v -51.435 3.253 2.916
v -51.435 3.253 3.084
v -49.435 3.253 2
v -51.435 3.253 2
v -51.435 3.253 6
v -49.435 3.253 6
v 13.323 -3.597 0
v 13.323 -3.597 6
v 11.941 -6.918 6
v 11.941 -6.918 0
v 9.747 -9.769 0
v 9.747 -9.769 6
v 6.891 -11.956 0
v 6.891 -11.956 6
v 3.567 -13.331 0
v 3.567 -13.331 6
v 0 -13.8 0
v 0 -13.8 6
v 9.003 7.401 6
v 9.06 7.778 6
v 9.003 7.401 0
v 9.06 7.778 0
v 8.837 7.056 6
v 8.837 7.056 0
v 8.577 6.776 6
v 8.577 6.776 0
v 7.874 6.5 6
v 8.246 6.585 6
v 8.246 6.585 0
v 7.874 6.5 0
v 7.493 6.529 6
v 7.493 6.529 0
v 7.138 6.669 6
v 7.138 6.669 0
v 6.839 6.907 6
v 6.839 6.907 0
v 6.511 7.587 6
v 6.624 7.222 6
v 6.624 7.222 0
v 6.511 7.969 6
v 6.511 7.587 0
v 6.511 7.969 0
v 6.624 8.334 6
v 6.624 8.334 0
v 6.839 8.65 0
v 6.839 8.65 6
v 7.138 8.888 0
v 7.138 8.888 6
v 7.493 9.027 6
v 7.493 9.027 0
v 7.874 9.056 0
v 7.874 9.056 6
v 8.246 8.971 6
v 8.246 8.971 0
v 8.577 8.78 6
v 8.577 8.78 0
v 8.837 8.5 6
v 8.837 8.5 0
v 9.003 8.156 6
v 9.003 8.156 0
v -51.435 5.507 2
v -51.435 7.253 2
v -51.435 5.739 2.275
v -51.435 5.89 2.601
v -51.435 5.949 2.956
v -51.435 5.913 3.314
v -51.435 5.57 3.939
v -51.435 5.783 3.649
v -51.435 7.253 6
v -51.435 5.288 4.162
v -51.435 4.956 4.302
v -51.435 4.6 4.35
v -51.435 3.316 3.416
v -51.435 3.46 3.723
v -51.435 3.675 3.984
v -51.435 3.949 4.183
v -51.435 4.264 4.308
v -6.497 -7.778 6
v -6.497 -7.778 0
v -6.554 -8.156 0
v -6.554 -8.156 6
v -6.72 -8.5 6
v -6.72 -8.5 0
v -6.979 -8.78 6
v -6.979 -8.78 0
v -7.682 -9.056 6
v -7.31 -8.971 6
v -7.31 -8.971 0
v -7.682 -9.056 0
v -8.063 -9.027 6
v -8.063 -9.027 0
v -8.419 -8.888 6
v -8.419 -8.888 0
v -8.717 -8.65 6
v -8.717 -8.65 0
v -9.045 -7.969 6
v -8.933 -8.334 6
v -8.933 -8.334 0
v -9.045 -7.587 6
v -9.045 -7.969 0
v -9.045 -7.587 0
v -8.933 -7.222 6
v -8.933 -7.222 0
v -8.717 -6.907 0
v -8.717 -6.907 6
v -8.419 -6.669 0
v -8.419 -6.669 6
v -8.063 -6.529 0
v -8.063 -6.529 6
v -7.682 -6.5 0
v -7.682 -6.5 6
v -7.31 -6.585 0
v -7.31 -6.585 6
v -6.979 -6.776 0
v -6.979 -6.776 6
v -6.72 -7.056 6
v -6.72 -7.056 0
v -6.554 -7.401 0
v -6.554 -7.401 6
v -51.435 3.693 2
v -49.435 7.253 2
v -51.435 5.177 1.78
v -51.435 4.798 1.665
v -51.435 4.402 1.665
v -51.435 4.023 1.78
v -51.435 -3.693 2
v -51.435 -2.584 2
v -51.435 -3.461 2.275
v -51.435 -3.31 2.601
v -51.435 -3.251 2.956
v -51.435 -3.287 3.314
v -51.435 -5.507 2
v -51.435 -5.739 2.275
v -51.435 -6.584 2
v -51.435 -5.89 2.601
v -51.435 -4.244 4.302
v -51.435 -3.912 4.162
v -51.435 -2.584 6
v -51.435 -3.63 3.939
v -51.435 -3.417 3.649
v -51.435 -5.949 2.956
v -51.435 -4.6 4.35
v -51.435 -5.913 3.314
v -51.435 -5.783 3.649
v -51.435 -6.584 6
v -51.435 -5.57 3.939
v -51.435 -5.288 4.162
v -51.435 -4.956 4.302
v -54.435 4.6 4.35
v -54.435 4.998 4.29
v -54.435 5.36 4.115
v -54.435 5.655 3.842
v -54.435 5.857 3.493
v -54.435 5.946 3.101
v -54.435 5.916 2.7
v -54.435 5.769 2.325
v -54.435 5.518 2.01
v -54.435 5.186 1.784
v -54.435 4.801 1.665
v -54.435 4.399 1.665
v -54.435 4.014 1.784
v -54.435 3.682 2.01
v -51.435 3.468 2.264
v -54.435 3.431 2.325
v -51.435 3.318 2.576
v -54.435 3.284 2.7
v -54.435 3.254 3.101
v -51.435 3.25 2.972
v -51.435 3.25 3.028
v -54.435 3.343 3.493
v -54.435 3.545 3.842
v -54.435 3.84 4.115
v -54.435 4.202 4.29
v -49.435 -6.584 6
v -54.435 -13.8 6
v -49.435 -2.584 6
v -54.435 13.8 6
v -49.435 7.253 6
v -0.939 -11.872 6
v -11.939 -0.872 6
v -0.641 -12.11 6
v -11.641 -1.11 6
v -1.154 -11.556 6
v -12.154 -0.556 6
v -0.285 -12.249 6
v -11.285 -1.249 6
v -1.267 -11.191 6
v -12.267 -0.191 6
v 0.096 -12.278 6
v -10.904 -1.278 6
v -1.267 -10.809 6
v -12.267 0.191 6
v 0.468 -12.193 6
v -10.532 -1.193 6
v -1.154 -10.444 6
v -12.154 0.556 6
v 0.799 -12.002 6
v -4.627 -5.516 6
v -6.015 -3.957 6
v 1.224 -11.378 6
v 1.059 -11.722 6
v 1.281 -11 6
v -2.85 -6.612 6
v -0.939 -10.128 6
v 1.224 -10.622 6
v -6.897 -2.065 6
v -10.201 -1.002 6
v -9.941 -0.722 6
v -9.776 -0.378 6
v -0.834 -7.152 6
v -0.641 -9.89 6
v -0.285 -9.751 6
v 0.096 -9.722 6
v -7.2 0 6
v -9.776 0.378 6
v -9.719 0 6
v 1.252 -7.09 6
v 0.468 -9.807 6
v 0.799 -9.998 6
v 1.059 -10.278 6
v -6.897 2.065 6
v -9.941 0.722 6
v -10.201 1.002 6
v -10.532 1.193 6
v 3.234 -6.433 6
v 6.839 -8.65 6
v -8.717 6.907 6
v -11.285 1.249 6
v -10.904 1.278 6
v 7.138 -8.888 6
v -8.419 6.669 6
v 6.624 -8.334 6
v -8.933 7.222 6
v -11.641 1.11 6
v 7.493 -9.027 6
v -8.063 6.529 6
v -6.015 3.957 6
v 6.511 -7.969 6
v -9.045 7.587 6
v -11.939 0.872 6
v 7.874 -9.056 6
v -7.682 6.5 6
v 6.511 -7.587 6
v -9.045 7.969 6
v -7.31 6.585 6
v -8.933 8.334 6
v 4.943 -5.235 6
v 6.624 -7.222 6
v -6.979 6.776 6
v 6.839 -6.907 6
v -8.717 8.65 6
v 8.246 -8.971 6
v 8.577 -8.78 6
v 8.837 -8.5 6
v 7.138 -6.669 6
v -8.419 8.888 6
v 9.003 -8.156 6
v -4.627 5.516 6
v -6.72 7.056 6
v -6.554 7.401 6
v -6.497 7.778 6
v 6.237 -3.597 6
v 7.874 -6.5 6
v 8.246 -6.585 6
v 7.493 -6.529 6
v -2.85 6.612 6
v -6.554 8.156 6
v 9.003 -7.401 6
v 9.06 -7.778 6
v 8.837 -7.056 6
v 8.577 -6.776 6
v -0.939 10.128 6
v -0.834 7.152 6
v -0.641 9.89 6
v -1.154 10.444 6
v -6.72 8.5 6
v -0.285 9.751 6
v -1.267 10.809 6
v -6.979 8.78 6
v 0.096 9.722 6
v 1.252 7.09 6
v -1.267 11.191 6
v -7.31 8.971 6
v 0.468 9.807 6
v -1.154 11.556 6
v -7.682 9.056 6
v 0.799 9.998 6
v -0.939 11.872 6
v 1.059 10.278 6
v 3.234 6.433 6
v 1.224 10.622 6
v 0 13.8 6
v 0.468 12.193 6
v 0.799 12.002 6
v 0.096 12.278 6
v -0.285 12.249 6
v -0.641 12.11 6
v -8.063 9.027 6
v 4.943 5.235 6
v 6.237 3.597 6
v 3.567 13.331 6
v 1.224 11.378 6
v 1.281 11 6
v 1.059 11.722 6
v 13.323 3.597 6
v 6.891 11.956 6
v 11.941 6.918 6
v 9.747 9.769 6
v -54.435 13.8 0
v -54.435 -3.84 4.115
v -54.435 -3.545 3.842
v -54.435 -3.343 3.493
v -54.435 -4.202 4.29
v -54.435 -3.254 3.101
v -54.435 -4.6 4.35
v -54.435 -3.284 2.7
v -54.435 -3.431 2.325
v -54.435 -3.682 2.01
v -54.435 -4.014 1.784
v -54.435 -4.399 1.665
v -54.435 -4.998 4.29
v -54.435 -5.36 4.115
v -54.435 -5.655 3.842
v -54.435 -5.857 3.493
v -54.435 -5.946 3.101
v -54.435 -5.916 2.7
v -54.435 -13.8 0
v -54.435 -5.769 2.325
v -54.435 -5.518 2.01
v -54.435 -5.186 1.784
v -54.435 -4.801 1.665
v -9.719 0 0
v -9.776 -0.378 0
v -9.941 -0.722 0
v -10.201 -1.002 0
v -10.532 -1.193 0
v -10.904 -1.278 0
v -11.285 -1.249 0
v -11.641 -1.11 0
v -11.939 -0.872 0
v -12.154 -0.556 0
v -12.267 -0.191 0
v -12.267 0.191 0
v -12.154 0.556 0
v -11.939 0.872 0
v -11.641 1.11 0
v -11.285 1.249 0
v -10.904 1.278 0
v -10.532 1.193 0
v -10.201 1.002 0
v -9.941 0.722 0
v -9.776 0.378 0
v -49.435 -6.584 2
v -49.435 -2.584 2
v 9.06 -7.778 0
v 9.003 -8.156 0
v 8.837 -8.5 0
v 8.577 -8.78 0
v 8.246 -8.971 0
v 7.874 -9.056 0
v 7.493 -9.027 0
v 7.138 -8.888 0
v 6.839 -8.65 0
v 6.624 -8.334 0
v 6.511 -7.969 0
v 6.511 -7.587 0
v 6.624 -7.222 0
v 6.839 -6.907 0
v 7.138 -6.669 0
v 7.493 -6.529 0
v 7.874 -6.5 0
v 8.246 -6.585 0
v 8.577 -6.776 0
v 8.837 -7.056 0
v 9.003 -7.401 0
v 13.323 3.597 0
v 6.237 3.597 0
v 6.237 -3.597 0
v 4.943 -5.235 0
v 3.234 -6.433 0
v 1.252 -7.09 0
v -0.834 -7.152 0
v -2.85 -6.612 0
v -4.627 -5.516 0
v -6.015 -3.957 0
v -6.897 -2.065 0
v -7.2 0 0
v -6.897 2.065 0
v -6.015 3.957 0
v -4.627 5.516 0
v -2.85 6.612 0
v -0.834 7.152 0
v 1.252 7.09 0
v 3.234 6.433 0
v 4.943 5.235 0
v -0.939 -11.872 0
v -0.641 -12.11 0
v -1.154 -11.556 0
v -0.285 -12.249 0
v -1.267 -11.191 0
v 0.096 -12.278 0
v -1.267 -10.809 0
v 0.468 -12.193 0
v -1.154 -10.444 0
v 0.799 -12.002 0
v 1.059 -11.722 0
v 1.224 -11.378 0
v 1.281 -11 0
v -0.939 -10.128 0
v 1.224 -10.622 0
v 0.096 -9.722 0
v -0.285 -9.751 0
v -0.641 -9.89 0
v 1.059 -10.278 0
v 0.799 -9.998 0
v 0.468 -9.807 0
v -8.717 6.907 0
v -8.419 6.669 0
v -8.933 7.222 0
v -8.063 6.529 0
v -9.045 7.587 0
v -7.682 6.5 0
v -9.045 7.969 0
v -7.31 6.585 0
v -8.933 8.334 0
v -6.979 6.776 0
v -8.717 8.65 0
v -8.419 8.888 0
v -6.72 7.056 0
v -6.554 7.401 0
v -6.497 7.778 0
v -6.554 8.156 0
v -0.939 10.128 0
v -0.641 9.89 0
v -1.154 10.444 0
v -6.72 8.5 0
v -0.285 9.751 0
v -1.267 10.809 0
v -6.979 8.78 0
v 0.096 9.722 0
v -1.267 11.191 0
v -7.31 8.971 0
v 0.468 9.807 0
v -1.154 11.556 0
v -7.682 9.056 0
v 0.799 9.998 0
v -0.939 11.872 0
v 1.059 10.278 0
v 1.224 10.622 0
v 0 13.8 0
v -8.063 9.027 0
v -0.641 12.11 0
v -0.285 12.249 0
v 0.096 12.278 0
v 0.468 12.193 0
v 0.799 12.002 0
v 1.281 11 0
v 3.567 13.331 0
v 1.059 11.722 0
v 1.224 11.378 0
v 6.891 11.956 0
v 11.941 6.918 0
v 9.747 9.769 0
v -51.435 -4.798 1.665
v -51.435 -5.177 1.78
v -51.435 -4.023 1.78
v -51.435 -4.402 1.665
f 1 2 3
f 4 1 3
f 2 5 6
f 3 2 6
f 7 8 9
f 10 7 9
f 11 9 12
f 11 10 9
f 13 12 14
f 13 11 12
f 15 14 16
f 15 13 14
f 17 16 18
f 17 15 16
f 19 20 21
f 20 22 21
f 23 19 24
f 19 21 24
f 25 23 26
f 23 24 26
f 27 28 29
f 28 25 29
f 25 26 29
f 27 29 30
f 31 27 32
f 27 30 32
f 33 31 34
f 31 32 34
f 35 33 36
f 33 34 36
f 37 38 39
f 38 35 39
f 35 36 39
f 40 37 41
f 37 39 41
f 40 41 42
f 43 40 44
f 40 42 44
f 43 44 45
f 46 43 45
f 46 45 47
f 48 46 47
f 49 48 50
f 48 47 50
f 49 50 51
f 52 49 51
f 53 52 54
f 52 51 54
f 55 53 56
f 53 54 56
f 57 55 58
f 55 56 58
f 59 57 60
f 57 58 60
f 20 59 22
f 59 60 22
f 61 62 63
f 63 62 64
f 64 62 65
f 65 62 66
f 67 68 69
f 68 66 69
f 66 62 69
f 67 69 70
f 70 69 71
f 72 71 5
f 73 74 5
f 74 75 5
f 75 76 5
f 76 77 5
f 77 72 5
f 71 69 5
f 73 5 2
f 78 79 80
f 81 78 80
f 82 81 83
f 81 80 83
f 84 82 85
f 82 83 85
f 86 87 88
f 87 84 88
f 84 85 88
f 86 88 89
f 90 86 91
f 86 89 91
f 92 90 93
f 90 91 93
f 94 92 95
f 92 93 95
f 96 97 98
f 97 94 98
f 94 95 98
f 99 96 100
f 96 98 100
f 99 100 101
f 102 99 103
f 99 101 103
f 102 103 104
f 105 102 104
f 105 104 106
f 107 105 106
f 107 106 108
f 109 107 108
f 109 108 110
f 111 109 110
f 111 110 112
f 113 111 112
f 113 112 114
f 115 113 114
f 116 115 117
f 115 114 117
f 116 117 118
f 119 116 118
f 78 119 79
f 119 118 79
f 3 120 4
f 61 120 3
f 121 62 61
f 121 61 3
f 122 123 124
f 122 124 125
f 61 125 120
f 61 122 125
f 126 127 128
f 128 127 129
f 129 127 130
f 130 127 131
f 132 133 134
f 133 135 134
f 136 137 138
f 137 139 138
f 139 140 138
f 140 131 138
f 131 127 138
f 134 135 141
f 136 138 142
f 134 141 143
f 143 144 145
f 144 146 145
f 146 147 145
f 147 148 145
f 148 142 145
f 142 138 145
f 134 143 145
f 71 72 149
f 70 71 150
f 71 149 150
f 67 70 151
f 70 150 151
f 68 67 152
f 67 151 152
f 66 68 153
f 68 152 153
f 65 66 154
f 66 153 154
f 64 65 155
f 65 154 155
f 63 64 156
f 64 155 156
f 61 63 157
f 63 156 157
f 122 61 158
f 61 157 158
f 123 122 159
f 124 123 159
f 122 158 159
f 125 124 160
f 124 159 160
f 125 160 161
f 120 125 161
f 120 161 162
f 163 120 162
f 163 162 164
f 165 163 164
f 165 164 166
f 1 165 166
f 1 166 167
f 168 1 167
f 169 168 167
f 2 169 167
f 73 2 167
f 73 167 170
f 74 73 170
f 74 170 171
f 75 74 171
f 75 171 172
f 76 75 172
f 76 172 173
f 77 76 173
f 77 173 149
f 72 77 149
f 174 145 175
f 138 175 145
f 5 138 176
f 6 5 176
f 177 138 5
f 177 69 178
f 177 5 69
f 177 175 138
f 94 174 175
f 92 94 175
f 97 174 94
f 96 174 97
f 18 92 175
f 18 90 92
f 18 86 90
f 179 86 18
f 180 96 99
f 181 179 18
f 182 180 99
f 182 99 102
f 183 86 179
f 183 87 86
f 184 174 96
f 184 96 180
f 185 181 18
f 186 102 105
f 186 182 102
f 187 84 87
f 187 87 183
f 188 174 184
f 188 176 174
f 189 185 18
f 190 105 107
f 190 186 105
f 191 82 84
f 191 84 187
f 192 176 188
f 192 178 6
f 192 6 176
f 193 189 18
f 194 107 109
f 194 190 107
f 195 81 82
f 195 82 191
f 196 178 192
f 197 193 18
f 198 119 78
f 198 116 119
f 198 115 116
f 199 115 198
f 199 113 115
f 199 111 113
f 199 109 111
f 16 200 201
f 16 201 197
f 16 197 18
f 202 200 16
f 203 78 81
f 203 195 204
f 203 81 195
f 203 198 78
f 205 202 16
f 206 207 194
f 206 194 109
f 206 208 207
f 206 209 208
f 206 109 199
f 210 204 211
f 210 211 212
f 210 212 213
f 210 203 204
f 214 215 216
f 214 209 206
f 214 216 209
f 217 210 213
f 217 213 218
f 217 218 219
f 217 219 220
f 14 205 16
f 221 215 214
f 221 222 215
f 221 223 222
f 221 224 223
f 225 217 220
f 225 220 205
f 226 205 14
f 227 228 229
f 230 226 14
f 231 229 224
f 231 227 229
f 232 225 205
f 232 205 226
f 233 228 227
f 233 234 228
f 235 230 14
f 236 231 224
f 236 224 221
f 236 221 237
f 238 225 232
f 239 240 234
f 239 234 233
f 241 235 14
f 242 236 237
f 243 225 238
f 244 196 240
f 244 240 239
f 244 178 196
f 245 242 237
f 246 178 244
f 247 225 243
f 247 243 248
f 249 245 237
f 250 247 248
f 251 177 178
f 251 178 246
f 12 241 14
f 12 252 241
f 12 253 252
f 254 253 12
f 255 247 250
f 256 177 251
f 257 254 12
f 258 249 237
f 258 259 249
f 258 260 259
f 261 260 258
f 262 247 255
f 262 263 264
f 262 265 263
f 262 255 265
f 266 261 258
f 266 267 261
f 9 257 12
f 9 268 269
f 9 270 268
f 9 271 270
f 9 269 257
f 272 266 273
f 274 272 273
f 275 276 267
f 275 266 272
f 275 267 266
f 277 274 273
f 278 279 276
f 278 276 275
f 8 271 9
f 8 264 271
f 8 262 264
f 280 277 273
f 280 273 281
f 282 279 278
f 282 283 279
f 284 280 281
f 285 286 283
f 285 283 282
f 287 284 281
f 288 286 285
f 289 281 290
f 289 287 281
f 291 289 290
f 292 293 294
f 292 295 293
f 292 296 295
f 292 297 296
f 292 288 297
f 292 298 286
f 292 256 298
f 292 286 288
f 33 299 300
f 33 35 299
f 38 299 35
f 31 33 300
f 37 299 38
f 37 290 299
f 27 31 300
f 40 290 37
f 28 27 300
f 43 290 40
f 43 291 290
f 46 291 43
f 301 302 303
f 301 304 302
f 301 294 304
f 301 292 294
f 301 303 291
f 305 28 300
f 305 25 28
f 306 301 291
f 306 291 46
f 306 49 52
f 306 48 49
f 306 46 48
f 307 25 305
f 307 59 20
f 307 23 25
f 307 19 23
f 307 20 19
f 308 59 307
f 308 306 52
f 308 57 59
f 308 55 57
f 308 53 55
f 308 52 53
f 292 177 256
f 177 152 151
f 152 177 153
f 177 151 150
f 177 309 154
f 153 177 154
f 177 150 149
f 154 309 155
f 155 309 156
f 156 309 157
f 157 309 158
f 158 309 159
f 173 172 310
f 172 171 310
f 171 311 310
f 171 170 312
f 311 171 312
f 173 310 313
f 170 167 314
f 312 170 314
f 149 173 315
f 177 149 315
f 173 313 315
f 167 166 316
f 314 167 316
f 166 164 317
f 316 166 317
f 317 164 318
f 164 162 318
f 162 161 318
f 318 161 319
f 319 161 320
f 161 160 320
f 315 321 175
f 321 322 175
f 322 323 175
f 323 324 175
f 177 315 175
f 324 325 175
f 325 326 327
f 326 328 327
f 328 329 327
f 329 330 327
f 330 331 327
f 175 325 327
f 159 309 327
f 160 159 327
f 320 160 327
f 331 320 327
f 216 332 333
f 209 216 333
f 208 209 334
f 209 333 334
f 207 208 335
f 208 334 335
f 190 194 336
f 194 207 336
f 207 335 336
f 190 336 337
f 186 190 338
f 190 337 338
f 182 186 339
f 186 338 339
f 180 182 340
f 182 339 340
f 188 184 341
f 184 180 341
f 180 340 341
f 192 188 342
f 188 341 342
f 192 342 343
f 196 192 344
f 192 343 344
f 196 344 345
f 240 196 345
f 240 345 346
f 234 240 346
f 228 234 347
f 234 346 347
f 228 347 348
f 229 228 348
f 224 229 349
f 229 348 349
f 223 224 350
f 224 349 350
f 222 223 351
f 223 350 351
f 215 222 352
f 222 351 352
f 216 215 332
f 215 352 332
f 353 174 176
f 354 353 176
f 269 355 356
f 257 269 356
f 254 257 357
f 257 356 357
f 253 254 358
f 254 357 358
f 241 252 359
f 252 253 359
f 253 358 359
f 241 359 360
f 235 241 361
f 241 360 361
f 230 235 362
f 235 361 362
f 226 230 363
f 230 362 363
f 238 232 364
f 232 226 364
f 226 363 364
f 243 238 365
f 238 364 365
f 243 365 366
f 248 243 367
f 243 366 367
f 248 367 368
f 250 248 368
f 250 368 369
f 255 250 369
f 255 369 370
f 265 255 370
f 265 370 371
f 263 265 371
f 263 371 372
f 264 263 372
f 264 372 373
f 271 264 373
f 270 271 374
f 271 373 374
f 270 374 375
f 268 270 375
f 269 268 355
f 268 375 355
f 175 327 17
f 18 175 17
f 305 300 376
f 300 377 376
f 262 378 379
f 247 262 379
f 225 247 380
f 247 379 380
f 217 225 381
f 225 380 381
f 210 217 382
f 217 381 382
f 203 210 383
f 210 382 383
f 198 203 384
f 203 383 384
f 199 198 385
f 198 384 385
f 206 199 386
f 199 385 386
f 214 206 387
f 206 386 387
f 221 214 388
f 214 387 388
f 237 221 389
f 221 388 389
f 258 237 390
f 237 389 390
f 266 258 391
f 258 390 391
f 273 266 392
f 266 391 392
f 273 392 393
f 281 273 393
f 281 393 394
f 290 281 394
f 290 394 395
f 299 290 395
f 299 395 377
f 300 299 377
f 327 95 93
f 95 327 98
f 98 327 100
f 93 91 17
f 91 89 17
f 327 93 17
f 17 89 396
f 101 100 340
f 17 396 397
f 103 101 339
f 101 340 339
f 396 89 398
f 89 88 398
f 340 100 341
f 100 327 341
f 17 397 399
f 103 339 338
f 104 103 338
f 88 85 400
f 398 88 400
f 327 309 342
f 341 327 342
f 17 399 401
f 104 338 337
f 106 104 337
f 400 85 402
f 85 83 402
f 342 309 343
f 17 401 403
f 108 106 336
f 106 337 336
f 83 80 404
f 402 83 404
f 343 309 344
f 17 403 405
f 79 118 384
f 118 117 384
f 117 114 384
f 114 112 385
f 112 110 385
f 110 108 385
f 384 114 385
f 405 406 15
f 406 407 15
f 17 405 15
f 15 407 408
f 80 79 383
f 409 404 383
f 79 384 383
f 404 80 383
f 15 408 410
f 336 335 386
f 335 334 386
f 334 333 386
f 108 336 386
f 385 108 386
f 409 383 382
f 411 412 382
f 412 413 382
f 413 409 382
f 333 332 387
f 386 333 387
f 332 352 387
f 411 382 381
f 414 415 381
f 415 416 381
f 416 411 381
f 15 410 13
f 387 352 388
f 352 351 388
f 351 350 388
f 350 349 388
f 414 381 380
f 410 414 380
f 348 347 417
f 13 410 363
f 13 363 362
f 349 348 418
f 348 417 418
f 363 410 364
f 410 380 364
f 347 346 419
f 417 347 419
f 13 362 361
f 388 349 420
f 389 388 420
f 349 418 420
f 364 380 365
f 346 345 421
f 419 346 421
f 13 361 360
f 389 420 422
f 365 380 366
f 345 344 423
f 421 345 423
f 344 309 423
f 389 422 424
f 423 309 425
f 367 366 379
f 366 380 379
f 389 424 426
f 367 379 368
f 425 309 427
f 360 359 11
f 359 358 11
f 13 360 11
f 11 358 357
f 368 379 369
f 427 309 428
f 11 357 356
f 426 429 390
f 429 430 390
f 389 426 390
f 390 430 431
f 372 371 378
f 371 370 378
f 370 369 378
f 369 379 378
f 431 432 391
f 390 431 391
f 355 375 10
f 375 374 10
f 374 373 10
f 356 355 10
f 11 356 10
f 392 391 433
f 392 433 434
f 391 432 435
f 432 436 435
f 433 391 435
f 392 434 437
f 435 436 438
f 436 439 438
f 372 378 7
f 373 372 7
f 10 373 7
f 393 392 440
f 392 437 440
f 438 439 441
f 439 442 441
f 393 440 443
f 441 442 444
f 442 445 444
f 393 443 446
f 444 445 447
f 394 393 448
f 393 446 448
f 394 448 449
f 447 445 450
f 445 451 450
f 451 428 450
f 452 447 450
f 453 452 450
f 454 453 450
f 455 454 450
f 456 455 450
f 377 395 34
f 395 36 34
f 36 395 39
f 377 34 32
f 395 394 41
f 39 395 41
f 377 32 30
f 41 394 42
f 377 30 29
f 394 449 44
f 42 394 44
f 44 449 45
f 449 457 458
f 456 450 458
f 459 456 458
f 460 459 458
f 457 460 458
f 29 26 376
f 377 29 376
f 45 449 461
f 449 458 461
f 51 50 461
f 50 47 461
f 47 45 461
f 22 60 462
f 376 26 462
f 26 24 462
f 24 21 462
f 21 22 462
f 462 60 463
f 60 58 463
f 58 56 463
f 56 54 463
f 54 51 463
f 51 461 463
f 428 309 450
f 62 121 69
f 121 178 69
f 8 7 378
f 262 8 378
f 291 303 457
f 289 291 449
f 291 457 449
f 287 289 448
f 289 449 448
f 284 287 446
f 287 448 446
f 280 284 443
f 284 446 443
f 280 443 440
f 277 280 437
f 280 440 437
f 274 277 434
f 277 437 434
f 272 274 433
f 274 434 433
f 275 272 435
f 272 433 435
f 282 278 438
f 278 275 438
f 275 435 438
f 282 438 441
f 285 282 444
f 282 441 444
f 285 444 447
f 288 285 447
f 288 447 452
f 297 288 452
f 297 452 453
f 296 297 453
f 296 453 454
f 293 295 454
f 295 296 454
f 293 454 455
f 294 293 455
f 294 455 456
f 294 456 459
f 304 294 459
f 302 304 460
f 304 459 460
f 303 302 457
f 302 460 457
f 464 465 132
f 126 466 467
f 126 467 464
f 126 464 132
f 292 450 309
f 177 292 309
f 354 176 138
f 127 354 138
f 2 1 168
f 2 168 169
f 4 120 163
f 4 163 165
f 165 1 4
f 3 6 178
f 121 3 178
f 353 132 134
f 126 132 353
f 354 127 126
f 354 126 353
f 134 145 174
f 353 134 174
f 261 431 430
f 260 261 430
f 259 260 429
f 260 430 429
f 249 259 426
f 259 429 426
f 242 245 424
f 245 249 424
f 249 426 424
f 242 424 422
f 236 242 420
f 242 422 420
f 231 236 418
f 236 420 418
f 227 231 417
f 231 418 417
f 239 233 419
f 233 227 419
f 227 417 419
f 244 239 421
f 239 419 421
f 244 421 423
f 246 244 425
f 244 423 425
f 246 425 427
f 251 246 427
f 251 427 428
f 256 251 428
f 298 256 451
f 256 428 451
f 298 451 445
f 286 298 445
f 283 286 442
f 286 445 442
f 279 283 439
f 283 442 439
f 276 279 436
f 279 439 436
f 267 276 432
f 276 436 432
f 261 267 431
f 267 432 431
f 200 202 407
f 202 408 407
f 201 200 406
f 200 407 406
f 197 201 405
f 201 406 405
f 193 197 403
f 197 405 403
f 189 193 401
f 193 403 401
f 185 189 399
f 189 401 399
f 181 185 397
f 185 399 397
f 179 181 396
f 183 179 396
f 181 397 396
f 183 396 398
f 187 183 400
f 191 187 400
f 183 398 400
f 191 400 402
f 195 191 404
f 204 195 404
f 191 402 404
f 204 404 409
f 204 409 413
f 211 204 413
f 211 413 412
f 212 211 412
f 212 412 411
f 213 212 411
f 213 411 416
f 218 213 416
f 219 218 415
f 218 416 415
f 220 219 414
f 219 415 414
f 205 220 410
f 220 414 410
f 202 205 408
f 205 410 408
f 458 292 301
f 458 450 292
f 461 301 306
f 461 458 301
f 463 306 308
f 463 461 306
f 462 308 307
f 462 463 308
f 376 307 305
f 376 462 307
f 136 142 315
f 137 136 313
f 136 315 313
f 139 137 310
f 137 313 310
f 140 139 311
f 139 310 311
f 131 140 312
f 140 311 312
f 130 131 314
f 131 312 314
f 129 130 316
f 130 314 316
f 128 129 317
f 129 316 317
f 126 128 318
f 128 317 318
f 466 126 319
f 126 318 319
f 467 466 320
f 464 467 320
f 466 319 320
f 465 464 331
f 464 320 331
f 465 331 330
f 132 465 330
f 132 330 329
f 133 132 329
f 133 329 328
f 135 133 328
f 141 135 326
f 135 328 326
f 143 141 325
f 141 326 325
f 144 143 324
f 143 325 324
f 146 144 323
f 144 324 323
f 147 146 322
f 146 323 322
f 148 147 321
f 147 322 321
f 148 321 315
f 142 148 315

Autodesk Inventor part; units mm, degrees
ref_plane "YZ Plane" through (0, 0, 0) normal (1, 0, 0) x (0, 1, 0)
ref_plane "XZ Plane" through (0, 0, 0) normal (0, 1, 0) x (-1, 0, 0)
ref_plane "XY Plane" through (0, 0, 0) normal (0, 0, 1) x (1, 0, 0)
sketch "스케치1" plane through (0, 0, 0) normal (0, 0, 1) x (1, 0, 0)
  circle A0 centre (0, 0) radius 13.8 projected
  circle A1 centre (0, 0) radius 7.2 projected
  circle A2 centre (0, -11) radius 1.2813 projected
  circle A3 centre (-7.7782, -7.7782) radius 1.2813 projected
  circle A4 centre (-11, 0) radius 1.2813 projected
  circle A5 centre (-7.7782, 7.7782) radius 1.2813 projected
  circle A6 centre (0, 11) radius 1.2813 projected
  circle A7 centre (7.7782, 7.7782) radius 1.2813 projected
  circle A8 centre (11, 0) radius 1.2813 projected
  circle A9 centre (7.7782, -7.7782) radius 1.2813 projected
  circle A10 centre (0, 0) radius 3.15 projected
  circle A11 centre (0, 0) radius 3.5972
  line L0 (0, -3.5972) -> (0, 3.5972)
  line L1 (0, 3.5972) -> (17.7956, 3.5972)
  line L2 (17.7956, 3.5972) -> (17.7956, -3.5972)
  line L3 (17.7956, -3.5972) -> (0, -3.5972)
  line L4 (-54.4347, 13.8) -> (-54.4347, -13.8) projected
  line L5 (0, -13.8) -> (0, 13.8)
  line L6 (0, 13.8) -> (-54.4347, 13.8)
  line L7 (-54.4347, 13.8) -> (-54.4347, -13.8)
  line L8 (-54.4347, -13.8) -> (0, -13.8)
  point P0 (0, 0)
  point P1 (6.237, 3.5972)
  point P2 (13.3229, 3.5972)
  point P3 (13.3229, -3.5972)
  point P4 (6.237, -3.5972)
extrude "돌출1" add sketch "스케치1" along normal blind 6 contours L5 A6 A1 A2 A0 | A0 L1 A1 L5 A6 | A0 L8 L4 L6 | L5 A2 A1 L3 A0
sketch "스케치2" plane through (-54.4347, -13.8, 0) normal (-1, 0, 0) x (0, 0, 1)
  line L0 (0, 13.8) -> (6, 13.8)
  line L1 (6, 15.0812) -> (6, 12.5187) projected
  line L2 (0, 13.8) -> (3, 13.8)
  line L3 (3, 13.8) -> (3, 0)
  line L4 (0, 0) -> (6, 0) projected
  line L5 (3, 0) -> (3, 9.2)
  line L6 (3, 9.2) -> (3, 18.4)
  circle A0 centre (3, 18.4) radius 1.35
  circle A1 centre (3, 9.2) radius 1.35
  dimension "d2" = 3
  dimension "d3" = 9.2
  dimension "d4" = 9.2
  dimension "d5" = 2.7
  dimension "d6" = 2.7
extrude "돌출2" cut sketch "스케치2" against normal blind 3
sketch "스케치3" plane through (0, 0, 6) normal (0, 0, 1) x (1, 0, 0)
  line L0 (-50.4347, -2.45) -> (-50.4347, -6.45) projected
  line L1 (-50.4347, 7.3745) -> (-50.4347, 3.3745) projected
  line L2 (-54.4347, 13.8) -> (-54.4347, -13.8) projected
  line L3 (-54.4347, 5.2526) -> (-50.4347, 5.2526)
  line L4 (-54.4347, -4.5845) -> (-50.4347, -4.5845)
  line L5 (-51.4347, -2.5845) -> (-51.4347, -6.5845)
  line L6 (-51.4347, -6.5845) -> (-49.4347, -6.5845)
  line L7 (-49.4347, -6.5845) -> (-49.4347, -2.5845)
  line L8 (-49.4347, -2.5845) -> (-51.4347, -2.5845)
  line L9 (-51.4347, -2.5845) -> (-49.4347, -6.5845) construction
  line L10 (-51.4347, -6.5845) -> (-49.4347, -2.5845) construction
  line L11 (-51.4347, 7.2526) -> (-51.4347, 3.2526)
  line L12 (-51.4347, 3.2526) -> (-49.4347, 3.2526)
  line L13 (-49.4347, 3.2526) -> (-49.4347, 7.2526)
  line L14 (-49.4347, 7.2526) -> (-51.4347, 7.2526)
  line L15 (-51.4347, 7.2526) -> (-49.4347, 3.2526) construction
  line L16 (-51.4347, 3.2526) -> (-49.4347, 7.2526) construction
  point P0 (0, 0)
  dimension "d9" = 4
  dimension "d10" = 2
  dimension "d11" = 4
  dimension "d12" = 2
extrude "돌출3" cut sketch "스케치3" against normal blind 4
properties part number "_thigh_adt_body"
